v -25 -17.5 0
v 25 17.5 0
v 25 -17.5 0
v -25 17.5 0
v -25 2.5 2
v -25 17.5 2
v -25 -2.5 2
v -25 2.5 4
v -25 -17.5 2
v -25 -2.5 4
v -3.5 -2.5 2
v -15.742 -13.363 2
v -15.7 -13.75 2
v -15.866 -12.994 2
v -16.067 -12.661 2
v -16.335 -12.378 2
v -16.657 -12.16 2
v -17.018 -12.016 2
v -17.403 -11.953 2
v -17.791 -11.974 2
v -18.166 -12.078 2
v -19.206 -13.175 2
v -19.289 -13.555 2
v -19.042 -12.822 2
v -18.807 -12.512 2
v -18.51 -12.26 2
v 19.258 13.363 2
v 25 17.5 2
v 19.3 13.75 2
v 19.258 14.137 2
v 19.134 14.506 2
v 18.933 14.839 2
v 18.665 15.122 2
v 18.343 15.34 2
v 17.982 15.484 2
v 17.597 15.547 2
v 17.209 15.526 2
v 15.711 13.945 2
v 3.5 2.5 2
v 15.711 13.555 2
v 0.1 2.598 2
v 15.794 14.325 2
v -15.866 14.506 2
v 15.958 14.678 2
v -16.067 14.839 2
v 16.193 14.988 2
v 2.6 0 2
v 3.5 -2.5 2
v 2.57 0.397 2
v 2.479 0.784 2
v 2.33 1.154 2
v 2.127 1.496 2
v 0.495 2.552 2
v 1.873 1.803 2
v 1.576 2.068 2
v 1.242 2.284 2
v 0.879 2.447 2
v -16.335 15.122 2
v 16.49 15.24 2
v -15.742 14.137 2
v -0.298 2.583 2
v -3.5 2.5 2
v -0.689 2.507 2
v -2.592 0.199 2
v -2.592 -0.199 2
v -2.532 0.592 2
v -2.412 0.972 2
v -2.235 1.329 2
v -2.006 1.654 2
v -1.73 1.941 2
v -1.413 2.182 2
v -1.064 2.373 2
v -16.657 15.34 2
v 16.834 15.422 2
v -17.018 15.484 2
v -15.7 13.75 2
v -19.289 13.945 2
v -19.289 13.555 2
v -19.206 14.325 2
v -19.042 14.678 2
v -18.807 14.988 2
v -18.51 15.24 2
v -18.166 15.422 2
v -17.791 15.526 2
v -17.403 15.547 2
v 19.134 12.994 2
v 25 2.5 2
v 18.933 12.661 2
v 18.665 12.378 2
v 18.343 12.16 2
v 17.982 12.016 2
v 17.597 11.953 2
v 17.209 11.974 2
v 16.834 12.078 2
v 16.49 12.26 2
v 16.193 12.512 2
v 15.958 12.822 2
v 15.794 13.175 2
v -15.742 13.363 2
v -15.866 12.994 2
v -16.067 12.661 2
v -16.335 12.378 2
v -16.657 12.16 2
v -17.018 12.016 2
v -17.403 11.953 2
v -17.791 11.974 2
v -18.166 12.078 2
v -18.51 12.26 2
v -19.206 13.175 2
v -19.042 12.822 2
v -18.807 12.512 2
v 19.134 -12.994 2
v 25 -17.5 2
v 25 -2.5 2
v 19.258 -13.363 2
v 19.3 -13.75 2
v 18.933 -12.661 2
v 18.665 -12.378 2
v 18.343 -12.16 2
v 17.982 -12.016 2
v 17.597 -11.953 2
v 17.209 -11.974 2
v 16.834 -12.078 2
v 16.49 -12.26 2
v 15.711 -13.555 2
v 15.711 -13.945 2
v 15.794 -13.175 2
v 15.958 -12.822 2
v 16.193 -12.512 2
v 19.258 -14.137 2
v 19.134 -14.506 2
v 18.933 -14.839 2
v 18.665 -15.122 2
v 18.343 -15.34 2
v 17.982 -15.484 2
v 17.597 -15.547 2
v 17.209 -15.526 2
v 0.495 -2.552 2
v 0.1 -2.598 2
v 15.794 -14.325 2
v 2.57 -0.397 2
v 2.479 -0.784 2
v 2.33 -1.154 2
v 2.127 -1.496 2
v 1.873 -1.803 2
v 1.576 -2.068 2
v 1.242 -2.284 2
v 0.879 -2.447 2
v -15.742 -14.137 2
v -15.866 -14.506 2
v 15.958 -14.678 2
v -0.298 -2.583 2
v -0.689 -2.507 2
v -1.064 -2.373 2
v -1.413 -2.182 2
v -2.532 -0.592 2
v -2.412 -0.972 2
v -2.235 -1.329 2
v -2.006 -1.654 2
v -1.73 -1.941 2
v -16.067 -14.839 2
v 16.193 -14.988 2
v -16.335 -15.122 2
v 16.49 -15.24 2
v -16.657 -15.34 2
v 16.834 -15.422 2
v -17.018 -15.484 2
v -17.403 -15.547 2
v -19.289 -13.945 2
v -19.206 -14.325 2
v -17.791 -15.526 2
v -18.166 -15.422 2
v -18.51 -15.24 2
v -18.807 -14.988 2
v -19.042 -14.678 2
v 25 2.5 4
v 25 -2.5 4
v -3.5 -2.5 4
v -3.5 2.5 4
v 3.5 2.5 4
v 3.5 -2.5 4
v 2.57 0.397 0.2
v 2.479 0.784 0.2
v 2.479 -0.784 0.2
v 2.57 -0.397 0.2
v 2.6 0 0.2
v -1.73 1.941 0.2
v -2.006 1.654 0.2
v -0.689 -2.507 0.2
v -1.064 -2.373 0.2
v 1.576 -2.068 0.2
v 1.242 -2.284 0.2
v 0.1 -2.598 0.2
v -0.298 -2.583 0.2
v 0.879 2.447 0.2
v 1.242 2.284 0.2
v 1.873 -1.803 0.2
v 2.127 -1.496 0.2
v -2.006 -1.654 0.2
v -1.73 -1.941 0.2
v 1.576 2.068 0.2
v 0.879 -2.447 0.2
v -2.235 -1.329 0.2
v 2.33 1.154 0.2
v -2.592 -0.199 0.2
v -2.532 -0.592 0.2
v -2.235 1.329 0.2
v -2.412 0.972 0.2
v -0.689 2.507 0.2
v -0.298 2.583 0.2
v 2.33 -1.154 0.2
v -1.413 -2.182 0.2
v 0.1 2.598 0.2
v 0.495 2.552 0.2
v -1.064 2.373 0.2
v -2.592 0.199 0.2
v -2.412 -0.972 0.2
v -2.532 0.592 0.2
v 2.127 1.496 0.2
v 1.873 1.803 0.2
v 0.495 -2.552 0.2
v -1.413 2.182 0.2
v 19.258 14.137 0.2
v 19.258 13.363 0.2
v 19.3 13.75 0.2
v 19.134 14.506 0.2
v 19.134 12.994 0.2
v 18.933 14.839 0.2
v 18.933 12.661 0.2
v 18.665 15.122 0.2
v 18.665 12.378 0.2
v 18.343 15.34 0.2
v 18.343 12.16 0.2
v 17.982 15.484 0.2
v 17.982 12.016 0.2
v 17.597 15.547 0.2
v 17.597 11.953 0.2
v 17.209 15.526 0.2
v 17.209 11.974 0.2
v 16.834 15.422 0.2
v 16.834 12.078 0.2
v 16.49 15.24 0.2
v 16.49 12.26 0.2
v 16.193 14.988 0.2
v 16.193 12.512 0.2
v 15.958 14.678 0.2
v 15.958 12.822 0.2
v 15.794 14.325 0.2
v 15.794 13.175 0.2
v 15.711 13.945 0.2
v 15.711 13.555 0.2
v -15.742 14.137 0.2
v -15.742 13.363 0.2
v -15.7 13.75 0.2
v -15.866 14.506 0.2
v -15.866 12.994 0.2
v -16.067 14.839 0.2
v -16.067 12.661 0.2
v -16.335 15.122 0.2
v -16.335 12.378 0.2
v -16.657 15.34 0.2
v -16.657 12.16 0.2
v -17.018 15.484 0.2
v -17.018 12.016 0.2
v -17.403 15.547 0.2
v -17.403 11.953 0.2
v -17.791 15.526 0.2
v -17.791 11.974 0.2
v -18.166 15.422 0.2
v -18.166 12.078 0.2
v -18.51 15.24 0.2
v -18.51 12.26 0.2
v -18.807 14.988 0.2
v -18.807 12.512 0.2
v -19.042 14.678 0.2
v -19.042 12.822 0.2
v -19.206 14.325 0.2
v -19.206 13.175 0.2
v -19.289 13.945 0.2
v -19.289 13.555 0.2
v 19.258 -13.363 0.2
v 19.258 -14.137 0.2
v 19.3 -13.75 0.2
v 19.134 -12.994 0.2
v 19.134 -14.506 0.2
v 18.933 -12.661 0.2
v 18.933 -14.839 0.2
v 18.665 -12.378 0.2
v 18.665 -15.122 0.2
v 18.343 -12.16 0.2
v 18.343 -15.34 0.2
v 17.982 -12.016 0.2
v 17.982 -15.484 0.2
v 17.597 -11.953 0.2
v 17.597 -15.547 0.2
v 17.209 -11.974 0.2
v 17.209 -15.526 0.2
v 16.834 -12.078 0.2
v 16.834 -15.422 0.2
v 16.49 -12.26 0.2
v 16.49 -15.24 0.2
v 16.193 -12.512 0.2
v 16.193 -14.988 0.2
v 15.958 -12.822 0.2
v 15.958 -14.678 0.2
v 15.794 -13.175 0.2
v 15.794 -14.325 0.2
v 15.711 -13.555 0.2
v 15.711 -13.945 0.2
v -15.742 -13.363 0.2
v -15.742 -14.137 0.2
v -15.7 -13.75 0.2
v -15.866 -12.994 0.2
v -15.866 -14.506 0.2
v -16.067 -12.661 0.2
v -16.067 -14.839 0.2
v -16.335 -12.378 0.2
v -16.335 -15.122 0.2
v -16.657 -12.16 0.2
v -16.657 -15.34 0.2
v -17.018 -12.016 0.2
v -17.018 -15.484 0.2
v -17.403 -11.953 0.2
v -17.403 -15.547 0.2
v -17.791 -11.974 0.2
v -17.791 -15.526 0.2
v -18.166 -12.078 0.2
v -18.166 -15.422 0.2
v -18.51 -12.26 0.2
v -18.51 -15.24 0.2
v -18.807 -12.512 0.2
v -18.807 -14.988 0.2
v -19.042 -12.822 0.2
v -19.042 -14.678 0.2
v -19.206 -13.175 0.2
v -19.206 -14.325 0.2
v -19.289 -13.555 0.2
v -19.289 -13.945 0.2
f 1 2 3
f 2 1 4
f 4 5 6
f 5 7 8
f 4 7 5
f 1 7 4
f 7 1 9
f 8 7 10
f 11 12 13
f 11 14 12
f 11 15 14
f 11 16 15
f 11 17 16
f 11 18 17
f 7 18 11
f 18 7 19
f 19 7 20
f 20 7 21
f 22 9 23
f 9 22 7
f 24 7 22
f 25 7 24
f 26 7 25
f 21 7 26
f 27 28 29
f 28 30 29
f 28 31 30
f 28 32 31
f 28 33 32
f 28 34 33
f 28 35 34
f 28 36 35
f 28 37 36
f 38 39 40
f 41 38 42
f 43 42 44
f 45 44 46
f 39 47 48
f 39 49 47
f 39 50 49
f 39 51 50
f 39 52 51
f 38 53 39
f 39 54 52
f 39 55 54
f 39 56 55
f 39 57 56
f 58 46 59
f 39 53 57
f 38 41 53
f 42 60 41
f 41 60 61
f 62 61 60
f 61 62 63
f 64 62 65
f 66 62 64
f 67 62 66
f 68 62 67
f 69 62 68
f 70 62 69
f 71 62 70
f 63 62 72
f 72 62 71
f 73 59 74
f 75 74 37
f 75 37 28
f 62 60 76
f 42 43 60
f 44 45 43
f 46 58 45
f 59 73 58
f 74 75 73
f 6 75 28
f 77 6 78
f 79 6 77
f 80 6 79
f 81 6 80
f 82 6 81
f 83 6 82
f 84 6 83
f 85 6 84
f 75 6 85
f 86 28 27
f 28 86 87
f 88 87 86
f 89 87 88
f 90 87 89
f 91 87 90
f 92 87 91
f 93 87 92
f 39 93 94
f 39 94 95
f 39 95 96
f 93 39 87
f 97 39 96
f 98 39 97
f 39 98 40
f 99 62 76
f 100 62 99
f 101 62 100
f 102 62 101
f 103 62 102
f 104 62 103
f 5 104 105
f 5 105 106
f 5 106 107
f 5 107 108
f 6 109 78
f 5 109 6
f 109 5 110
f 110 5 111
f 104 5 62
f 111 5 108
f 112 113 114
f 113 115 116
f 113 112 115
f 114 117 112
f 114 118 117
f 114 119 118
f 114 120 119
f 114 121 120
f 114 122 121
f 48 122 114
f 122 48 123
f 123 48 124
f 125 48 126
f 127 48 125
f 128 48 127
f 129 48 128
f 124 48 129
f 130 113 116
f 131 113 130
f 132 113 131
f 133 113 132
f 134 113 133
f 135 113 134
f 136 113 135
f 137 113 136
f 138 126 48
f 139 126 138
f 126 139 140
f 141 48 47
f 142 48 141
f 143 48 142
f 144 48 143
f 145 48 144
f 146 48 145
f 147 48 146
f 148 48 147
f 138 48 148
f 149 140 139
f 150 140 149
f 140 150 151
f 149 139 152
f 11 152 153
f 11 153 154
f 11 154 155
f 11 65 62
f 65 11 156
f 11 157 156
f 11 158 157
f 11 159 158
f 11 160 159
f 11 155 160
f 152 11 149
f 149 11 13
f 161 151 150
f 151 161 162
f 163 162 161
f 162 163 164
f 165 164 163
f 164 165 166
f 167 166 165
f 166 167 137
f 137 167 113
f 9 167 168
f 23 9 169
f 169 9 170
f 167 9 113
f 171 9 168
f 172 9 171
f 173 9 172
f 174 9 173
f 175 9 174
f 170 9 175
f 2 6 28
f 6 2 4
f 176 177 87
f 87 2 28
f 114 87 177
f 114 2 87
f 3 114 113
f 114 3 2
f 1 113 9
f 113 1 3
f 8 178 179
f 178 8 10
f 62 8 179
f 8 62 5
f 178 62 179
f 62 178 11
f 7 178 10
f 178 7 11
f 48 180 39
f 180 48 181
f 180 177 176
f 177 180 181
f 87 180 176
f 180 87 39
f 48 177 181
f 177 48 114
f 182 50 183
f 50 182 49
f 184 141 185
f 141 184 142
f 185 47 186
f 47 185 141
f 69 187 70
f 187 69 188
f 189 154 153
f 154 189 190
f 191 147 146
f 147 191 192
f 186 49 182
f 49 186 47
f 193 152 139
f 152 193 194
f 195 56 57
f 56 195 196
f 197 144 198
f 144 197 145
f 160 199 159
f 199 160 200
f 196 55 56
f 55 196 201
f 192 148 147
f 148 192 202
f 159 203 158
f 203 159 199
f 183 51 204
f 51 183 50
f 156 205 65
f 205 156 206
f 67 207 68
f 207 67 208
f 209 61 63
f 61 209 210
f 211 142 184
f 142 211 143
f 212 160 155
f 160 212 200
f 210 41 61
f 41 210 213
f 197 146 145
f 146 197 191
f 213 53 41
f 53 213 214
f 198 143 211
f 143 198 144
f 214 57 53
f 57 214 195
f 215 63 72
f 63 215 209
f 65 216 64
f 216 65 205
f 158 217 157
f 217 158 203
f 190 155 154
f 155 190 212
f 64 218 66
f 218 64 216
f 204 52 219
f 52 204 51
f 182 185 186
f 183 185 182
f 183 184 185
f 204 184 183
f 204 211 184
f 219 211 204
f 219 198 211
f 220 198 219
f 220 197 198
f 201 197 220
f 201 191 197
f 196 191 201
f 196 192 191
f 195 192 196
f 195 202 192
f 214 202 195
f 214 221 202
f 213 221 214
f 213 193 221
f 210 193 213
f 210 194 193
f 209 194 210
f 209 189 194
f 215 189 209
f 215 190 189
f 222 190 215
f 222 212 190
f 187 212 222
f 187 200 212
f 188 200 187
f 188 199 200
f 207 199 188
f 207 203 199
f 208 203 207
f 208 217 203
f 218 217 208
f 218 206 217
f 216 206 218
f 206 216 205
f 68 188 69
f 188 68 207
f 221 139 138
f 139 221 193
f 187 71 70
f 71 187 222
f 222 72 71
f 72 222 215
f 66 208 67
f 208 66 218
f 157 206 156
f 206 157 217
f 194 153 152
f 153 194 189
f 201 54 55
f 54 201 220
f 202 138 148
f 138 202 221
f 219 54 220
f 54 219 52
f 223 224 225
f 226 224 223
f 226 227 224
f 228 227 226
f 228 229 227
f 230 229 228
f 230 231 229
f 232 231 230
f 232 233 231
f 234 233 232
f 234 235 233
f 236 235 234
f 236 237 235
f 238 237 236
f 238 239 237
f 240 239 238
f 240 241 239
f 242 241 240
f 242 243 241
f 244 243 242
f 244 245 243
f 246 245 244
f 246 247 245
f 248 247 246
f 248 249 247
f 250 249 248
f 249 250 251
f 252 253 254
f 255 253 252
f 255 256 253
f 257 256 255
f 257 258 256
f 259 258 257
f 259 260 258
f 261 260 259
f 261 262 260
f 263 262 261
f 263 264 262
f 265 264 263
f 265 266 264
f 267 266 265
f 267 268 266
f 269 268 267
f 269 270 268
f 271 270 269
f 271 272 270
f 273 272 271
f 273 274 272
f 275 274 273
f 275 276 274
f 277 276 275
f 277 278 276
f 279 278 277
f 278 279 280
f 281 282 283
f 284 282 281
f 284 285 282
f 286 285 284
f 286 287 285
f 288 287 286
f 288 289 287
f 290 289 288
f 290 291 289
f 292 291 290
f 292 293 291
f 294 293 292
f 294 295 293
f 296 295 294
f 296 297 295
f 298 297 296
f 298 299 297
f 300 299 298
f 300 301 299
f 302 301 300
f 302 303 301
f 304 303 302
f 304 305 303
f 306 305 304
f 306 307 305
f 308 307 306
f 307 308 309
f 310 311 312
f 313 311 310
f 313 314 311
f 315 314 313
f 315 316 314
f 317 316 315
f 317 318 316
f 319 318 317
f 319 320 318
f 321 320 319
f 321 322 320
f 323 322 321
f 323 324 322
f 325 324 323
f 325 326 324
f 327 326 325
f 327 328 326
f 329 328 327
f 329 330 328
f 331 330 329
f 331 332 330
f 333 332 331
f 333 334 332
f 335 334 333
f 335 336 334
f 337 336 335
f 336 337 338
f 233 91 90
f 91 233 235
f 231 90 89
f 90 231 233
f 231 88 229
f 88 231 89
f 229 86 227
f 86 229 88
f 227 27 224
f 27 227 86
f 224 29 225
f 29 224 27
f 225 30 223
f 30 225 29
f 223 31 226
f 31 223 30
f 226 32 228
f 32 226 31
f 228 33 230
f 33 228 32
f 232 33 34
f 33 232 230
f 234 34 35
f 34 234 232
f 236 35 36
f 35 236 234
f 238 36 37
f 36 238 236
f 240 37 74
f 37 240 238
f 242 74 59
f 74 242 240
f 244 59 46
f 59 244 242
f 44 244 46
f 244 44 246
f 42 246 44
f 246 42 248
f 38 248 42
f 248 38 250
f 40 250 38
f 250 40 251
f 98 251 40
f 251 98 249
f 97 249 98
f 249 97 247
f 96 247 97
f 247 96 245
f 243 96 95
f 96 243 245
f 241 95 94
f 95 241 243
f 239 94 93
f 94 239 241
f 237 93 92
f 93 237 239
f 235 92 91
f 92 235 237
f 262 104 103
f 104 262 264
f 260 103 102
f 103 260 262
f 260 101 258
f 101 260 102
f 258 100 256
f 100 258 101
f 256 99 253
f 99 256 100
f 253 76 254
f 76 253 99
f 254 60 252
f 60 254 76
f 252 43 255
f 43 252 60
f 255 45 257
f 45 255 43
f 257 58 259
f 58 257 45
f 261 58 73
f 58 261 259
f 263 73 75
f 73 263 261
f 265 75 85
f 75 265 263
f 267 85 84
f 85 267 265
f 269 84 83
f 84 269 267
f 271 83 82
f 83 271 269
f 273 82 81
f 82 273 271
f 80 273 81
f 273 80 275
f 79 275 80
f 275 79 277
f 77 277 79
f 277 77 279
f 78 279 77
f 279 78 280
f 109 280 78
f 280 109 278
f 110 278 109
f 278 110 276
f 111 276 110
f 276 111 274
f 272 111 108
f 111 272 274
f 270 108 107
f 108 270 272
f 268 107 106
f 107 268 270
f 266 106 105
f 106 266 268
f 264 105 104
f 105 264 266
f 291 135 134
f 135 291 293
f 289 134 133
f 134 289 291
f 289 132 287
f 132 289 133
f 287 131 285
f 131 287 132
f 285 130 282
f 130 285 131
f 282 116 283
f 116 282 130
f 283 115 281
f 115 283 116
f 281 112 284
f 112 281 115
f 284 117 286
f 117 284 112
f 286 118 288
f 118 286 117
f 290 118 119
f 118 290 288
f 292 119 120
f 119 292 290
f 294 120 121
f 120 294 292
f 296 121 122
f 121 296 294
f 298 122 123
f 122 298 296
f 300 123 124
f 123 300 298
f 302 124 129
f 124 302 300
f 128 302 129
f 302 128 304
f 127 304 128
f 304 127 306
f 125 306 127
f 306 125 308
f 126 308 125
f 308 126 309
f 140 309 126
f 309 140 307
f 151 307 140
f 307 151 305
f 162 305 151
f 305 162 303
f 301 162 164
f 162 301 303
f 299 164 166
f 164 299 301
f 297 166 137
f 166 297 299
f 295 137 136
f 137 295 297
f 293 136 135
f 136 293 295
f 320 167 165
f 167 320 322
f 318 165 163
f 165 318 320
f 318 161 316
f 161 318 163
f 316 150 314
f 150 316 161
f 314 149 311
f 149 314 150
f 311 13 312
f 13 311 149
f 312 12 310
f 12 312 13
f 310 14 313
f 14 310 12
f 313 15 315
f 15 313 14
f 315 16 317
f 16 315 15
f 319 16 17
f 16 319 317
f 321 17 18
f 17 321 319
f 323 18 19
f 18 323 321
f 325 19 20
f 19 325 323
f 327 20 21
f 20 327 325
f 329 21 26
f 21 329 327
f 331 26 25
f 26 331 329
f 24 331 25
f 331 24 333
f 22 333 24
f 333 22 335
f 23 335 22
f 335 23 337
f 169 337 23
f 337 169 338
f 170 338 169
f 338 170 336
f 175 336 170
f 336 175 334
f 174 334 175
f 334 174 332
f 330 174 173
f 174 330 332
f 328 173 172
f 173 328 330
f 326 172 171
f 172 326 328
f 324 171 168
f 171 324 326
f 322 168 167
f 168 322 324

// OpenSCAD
//$fn=60;
$fa=5;
$fs=.4;

rail_width = 20;
feet_lenght = 50;//70
feet_width = 35;
feet_height = 2;
lock_lenght = (feet_lenght-7)/2;
lock_width = 5;
screw_distance_x = (feet_lenght)/2-7.5;
screw_distance_y = (feet_width + rail_width)/4;

rail_hole = 5.2;
screw_hole = 3.6;

echo(screw_distance_x);
echo(screw_distance_y);

difference(){
    body_all();
    translate([0,0,0.2]) mounting_holes();
}

module body_all(){
    linear_extrude(height=feet_height) square([feet_lenght,feet_width],center=true);
    
    lock(-feet_lenght/2+lock_lenght/2);
    lock(feet_lenght/2-lock_lenght/2);
    
    //linear_extrude(height=20) square([feet_lenght,20],center=true);
}

module lock(x=0){
    translate([x,0,0]) linear_extrude(height=feet_height+2) square([lock_lenght,lock_width],center=true);
}

module mounting_holes(){
    holes_height = 10;
    linear_extrude(height=holes_height){
        circle(d=rail_hole);
    }
    linear_extrude(height=holes_height){
        translate([screw_distance_x,screw_distance_y,0]) circle(d=screw_hole);
        translate([screw_distance_x,-screw_distance_y,0]) circle(d=screw_hole);
        translate([-screw_distance_x,screw_distance_y,0]) circle(d=screw_hole);
        translate([-screw_distance_x,-screw_distance_y,0]) circle(d=screw_hole);
    }    
}
